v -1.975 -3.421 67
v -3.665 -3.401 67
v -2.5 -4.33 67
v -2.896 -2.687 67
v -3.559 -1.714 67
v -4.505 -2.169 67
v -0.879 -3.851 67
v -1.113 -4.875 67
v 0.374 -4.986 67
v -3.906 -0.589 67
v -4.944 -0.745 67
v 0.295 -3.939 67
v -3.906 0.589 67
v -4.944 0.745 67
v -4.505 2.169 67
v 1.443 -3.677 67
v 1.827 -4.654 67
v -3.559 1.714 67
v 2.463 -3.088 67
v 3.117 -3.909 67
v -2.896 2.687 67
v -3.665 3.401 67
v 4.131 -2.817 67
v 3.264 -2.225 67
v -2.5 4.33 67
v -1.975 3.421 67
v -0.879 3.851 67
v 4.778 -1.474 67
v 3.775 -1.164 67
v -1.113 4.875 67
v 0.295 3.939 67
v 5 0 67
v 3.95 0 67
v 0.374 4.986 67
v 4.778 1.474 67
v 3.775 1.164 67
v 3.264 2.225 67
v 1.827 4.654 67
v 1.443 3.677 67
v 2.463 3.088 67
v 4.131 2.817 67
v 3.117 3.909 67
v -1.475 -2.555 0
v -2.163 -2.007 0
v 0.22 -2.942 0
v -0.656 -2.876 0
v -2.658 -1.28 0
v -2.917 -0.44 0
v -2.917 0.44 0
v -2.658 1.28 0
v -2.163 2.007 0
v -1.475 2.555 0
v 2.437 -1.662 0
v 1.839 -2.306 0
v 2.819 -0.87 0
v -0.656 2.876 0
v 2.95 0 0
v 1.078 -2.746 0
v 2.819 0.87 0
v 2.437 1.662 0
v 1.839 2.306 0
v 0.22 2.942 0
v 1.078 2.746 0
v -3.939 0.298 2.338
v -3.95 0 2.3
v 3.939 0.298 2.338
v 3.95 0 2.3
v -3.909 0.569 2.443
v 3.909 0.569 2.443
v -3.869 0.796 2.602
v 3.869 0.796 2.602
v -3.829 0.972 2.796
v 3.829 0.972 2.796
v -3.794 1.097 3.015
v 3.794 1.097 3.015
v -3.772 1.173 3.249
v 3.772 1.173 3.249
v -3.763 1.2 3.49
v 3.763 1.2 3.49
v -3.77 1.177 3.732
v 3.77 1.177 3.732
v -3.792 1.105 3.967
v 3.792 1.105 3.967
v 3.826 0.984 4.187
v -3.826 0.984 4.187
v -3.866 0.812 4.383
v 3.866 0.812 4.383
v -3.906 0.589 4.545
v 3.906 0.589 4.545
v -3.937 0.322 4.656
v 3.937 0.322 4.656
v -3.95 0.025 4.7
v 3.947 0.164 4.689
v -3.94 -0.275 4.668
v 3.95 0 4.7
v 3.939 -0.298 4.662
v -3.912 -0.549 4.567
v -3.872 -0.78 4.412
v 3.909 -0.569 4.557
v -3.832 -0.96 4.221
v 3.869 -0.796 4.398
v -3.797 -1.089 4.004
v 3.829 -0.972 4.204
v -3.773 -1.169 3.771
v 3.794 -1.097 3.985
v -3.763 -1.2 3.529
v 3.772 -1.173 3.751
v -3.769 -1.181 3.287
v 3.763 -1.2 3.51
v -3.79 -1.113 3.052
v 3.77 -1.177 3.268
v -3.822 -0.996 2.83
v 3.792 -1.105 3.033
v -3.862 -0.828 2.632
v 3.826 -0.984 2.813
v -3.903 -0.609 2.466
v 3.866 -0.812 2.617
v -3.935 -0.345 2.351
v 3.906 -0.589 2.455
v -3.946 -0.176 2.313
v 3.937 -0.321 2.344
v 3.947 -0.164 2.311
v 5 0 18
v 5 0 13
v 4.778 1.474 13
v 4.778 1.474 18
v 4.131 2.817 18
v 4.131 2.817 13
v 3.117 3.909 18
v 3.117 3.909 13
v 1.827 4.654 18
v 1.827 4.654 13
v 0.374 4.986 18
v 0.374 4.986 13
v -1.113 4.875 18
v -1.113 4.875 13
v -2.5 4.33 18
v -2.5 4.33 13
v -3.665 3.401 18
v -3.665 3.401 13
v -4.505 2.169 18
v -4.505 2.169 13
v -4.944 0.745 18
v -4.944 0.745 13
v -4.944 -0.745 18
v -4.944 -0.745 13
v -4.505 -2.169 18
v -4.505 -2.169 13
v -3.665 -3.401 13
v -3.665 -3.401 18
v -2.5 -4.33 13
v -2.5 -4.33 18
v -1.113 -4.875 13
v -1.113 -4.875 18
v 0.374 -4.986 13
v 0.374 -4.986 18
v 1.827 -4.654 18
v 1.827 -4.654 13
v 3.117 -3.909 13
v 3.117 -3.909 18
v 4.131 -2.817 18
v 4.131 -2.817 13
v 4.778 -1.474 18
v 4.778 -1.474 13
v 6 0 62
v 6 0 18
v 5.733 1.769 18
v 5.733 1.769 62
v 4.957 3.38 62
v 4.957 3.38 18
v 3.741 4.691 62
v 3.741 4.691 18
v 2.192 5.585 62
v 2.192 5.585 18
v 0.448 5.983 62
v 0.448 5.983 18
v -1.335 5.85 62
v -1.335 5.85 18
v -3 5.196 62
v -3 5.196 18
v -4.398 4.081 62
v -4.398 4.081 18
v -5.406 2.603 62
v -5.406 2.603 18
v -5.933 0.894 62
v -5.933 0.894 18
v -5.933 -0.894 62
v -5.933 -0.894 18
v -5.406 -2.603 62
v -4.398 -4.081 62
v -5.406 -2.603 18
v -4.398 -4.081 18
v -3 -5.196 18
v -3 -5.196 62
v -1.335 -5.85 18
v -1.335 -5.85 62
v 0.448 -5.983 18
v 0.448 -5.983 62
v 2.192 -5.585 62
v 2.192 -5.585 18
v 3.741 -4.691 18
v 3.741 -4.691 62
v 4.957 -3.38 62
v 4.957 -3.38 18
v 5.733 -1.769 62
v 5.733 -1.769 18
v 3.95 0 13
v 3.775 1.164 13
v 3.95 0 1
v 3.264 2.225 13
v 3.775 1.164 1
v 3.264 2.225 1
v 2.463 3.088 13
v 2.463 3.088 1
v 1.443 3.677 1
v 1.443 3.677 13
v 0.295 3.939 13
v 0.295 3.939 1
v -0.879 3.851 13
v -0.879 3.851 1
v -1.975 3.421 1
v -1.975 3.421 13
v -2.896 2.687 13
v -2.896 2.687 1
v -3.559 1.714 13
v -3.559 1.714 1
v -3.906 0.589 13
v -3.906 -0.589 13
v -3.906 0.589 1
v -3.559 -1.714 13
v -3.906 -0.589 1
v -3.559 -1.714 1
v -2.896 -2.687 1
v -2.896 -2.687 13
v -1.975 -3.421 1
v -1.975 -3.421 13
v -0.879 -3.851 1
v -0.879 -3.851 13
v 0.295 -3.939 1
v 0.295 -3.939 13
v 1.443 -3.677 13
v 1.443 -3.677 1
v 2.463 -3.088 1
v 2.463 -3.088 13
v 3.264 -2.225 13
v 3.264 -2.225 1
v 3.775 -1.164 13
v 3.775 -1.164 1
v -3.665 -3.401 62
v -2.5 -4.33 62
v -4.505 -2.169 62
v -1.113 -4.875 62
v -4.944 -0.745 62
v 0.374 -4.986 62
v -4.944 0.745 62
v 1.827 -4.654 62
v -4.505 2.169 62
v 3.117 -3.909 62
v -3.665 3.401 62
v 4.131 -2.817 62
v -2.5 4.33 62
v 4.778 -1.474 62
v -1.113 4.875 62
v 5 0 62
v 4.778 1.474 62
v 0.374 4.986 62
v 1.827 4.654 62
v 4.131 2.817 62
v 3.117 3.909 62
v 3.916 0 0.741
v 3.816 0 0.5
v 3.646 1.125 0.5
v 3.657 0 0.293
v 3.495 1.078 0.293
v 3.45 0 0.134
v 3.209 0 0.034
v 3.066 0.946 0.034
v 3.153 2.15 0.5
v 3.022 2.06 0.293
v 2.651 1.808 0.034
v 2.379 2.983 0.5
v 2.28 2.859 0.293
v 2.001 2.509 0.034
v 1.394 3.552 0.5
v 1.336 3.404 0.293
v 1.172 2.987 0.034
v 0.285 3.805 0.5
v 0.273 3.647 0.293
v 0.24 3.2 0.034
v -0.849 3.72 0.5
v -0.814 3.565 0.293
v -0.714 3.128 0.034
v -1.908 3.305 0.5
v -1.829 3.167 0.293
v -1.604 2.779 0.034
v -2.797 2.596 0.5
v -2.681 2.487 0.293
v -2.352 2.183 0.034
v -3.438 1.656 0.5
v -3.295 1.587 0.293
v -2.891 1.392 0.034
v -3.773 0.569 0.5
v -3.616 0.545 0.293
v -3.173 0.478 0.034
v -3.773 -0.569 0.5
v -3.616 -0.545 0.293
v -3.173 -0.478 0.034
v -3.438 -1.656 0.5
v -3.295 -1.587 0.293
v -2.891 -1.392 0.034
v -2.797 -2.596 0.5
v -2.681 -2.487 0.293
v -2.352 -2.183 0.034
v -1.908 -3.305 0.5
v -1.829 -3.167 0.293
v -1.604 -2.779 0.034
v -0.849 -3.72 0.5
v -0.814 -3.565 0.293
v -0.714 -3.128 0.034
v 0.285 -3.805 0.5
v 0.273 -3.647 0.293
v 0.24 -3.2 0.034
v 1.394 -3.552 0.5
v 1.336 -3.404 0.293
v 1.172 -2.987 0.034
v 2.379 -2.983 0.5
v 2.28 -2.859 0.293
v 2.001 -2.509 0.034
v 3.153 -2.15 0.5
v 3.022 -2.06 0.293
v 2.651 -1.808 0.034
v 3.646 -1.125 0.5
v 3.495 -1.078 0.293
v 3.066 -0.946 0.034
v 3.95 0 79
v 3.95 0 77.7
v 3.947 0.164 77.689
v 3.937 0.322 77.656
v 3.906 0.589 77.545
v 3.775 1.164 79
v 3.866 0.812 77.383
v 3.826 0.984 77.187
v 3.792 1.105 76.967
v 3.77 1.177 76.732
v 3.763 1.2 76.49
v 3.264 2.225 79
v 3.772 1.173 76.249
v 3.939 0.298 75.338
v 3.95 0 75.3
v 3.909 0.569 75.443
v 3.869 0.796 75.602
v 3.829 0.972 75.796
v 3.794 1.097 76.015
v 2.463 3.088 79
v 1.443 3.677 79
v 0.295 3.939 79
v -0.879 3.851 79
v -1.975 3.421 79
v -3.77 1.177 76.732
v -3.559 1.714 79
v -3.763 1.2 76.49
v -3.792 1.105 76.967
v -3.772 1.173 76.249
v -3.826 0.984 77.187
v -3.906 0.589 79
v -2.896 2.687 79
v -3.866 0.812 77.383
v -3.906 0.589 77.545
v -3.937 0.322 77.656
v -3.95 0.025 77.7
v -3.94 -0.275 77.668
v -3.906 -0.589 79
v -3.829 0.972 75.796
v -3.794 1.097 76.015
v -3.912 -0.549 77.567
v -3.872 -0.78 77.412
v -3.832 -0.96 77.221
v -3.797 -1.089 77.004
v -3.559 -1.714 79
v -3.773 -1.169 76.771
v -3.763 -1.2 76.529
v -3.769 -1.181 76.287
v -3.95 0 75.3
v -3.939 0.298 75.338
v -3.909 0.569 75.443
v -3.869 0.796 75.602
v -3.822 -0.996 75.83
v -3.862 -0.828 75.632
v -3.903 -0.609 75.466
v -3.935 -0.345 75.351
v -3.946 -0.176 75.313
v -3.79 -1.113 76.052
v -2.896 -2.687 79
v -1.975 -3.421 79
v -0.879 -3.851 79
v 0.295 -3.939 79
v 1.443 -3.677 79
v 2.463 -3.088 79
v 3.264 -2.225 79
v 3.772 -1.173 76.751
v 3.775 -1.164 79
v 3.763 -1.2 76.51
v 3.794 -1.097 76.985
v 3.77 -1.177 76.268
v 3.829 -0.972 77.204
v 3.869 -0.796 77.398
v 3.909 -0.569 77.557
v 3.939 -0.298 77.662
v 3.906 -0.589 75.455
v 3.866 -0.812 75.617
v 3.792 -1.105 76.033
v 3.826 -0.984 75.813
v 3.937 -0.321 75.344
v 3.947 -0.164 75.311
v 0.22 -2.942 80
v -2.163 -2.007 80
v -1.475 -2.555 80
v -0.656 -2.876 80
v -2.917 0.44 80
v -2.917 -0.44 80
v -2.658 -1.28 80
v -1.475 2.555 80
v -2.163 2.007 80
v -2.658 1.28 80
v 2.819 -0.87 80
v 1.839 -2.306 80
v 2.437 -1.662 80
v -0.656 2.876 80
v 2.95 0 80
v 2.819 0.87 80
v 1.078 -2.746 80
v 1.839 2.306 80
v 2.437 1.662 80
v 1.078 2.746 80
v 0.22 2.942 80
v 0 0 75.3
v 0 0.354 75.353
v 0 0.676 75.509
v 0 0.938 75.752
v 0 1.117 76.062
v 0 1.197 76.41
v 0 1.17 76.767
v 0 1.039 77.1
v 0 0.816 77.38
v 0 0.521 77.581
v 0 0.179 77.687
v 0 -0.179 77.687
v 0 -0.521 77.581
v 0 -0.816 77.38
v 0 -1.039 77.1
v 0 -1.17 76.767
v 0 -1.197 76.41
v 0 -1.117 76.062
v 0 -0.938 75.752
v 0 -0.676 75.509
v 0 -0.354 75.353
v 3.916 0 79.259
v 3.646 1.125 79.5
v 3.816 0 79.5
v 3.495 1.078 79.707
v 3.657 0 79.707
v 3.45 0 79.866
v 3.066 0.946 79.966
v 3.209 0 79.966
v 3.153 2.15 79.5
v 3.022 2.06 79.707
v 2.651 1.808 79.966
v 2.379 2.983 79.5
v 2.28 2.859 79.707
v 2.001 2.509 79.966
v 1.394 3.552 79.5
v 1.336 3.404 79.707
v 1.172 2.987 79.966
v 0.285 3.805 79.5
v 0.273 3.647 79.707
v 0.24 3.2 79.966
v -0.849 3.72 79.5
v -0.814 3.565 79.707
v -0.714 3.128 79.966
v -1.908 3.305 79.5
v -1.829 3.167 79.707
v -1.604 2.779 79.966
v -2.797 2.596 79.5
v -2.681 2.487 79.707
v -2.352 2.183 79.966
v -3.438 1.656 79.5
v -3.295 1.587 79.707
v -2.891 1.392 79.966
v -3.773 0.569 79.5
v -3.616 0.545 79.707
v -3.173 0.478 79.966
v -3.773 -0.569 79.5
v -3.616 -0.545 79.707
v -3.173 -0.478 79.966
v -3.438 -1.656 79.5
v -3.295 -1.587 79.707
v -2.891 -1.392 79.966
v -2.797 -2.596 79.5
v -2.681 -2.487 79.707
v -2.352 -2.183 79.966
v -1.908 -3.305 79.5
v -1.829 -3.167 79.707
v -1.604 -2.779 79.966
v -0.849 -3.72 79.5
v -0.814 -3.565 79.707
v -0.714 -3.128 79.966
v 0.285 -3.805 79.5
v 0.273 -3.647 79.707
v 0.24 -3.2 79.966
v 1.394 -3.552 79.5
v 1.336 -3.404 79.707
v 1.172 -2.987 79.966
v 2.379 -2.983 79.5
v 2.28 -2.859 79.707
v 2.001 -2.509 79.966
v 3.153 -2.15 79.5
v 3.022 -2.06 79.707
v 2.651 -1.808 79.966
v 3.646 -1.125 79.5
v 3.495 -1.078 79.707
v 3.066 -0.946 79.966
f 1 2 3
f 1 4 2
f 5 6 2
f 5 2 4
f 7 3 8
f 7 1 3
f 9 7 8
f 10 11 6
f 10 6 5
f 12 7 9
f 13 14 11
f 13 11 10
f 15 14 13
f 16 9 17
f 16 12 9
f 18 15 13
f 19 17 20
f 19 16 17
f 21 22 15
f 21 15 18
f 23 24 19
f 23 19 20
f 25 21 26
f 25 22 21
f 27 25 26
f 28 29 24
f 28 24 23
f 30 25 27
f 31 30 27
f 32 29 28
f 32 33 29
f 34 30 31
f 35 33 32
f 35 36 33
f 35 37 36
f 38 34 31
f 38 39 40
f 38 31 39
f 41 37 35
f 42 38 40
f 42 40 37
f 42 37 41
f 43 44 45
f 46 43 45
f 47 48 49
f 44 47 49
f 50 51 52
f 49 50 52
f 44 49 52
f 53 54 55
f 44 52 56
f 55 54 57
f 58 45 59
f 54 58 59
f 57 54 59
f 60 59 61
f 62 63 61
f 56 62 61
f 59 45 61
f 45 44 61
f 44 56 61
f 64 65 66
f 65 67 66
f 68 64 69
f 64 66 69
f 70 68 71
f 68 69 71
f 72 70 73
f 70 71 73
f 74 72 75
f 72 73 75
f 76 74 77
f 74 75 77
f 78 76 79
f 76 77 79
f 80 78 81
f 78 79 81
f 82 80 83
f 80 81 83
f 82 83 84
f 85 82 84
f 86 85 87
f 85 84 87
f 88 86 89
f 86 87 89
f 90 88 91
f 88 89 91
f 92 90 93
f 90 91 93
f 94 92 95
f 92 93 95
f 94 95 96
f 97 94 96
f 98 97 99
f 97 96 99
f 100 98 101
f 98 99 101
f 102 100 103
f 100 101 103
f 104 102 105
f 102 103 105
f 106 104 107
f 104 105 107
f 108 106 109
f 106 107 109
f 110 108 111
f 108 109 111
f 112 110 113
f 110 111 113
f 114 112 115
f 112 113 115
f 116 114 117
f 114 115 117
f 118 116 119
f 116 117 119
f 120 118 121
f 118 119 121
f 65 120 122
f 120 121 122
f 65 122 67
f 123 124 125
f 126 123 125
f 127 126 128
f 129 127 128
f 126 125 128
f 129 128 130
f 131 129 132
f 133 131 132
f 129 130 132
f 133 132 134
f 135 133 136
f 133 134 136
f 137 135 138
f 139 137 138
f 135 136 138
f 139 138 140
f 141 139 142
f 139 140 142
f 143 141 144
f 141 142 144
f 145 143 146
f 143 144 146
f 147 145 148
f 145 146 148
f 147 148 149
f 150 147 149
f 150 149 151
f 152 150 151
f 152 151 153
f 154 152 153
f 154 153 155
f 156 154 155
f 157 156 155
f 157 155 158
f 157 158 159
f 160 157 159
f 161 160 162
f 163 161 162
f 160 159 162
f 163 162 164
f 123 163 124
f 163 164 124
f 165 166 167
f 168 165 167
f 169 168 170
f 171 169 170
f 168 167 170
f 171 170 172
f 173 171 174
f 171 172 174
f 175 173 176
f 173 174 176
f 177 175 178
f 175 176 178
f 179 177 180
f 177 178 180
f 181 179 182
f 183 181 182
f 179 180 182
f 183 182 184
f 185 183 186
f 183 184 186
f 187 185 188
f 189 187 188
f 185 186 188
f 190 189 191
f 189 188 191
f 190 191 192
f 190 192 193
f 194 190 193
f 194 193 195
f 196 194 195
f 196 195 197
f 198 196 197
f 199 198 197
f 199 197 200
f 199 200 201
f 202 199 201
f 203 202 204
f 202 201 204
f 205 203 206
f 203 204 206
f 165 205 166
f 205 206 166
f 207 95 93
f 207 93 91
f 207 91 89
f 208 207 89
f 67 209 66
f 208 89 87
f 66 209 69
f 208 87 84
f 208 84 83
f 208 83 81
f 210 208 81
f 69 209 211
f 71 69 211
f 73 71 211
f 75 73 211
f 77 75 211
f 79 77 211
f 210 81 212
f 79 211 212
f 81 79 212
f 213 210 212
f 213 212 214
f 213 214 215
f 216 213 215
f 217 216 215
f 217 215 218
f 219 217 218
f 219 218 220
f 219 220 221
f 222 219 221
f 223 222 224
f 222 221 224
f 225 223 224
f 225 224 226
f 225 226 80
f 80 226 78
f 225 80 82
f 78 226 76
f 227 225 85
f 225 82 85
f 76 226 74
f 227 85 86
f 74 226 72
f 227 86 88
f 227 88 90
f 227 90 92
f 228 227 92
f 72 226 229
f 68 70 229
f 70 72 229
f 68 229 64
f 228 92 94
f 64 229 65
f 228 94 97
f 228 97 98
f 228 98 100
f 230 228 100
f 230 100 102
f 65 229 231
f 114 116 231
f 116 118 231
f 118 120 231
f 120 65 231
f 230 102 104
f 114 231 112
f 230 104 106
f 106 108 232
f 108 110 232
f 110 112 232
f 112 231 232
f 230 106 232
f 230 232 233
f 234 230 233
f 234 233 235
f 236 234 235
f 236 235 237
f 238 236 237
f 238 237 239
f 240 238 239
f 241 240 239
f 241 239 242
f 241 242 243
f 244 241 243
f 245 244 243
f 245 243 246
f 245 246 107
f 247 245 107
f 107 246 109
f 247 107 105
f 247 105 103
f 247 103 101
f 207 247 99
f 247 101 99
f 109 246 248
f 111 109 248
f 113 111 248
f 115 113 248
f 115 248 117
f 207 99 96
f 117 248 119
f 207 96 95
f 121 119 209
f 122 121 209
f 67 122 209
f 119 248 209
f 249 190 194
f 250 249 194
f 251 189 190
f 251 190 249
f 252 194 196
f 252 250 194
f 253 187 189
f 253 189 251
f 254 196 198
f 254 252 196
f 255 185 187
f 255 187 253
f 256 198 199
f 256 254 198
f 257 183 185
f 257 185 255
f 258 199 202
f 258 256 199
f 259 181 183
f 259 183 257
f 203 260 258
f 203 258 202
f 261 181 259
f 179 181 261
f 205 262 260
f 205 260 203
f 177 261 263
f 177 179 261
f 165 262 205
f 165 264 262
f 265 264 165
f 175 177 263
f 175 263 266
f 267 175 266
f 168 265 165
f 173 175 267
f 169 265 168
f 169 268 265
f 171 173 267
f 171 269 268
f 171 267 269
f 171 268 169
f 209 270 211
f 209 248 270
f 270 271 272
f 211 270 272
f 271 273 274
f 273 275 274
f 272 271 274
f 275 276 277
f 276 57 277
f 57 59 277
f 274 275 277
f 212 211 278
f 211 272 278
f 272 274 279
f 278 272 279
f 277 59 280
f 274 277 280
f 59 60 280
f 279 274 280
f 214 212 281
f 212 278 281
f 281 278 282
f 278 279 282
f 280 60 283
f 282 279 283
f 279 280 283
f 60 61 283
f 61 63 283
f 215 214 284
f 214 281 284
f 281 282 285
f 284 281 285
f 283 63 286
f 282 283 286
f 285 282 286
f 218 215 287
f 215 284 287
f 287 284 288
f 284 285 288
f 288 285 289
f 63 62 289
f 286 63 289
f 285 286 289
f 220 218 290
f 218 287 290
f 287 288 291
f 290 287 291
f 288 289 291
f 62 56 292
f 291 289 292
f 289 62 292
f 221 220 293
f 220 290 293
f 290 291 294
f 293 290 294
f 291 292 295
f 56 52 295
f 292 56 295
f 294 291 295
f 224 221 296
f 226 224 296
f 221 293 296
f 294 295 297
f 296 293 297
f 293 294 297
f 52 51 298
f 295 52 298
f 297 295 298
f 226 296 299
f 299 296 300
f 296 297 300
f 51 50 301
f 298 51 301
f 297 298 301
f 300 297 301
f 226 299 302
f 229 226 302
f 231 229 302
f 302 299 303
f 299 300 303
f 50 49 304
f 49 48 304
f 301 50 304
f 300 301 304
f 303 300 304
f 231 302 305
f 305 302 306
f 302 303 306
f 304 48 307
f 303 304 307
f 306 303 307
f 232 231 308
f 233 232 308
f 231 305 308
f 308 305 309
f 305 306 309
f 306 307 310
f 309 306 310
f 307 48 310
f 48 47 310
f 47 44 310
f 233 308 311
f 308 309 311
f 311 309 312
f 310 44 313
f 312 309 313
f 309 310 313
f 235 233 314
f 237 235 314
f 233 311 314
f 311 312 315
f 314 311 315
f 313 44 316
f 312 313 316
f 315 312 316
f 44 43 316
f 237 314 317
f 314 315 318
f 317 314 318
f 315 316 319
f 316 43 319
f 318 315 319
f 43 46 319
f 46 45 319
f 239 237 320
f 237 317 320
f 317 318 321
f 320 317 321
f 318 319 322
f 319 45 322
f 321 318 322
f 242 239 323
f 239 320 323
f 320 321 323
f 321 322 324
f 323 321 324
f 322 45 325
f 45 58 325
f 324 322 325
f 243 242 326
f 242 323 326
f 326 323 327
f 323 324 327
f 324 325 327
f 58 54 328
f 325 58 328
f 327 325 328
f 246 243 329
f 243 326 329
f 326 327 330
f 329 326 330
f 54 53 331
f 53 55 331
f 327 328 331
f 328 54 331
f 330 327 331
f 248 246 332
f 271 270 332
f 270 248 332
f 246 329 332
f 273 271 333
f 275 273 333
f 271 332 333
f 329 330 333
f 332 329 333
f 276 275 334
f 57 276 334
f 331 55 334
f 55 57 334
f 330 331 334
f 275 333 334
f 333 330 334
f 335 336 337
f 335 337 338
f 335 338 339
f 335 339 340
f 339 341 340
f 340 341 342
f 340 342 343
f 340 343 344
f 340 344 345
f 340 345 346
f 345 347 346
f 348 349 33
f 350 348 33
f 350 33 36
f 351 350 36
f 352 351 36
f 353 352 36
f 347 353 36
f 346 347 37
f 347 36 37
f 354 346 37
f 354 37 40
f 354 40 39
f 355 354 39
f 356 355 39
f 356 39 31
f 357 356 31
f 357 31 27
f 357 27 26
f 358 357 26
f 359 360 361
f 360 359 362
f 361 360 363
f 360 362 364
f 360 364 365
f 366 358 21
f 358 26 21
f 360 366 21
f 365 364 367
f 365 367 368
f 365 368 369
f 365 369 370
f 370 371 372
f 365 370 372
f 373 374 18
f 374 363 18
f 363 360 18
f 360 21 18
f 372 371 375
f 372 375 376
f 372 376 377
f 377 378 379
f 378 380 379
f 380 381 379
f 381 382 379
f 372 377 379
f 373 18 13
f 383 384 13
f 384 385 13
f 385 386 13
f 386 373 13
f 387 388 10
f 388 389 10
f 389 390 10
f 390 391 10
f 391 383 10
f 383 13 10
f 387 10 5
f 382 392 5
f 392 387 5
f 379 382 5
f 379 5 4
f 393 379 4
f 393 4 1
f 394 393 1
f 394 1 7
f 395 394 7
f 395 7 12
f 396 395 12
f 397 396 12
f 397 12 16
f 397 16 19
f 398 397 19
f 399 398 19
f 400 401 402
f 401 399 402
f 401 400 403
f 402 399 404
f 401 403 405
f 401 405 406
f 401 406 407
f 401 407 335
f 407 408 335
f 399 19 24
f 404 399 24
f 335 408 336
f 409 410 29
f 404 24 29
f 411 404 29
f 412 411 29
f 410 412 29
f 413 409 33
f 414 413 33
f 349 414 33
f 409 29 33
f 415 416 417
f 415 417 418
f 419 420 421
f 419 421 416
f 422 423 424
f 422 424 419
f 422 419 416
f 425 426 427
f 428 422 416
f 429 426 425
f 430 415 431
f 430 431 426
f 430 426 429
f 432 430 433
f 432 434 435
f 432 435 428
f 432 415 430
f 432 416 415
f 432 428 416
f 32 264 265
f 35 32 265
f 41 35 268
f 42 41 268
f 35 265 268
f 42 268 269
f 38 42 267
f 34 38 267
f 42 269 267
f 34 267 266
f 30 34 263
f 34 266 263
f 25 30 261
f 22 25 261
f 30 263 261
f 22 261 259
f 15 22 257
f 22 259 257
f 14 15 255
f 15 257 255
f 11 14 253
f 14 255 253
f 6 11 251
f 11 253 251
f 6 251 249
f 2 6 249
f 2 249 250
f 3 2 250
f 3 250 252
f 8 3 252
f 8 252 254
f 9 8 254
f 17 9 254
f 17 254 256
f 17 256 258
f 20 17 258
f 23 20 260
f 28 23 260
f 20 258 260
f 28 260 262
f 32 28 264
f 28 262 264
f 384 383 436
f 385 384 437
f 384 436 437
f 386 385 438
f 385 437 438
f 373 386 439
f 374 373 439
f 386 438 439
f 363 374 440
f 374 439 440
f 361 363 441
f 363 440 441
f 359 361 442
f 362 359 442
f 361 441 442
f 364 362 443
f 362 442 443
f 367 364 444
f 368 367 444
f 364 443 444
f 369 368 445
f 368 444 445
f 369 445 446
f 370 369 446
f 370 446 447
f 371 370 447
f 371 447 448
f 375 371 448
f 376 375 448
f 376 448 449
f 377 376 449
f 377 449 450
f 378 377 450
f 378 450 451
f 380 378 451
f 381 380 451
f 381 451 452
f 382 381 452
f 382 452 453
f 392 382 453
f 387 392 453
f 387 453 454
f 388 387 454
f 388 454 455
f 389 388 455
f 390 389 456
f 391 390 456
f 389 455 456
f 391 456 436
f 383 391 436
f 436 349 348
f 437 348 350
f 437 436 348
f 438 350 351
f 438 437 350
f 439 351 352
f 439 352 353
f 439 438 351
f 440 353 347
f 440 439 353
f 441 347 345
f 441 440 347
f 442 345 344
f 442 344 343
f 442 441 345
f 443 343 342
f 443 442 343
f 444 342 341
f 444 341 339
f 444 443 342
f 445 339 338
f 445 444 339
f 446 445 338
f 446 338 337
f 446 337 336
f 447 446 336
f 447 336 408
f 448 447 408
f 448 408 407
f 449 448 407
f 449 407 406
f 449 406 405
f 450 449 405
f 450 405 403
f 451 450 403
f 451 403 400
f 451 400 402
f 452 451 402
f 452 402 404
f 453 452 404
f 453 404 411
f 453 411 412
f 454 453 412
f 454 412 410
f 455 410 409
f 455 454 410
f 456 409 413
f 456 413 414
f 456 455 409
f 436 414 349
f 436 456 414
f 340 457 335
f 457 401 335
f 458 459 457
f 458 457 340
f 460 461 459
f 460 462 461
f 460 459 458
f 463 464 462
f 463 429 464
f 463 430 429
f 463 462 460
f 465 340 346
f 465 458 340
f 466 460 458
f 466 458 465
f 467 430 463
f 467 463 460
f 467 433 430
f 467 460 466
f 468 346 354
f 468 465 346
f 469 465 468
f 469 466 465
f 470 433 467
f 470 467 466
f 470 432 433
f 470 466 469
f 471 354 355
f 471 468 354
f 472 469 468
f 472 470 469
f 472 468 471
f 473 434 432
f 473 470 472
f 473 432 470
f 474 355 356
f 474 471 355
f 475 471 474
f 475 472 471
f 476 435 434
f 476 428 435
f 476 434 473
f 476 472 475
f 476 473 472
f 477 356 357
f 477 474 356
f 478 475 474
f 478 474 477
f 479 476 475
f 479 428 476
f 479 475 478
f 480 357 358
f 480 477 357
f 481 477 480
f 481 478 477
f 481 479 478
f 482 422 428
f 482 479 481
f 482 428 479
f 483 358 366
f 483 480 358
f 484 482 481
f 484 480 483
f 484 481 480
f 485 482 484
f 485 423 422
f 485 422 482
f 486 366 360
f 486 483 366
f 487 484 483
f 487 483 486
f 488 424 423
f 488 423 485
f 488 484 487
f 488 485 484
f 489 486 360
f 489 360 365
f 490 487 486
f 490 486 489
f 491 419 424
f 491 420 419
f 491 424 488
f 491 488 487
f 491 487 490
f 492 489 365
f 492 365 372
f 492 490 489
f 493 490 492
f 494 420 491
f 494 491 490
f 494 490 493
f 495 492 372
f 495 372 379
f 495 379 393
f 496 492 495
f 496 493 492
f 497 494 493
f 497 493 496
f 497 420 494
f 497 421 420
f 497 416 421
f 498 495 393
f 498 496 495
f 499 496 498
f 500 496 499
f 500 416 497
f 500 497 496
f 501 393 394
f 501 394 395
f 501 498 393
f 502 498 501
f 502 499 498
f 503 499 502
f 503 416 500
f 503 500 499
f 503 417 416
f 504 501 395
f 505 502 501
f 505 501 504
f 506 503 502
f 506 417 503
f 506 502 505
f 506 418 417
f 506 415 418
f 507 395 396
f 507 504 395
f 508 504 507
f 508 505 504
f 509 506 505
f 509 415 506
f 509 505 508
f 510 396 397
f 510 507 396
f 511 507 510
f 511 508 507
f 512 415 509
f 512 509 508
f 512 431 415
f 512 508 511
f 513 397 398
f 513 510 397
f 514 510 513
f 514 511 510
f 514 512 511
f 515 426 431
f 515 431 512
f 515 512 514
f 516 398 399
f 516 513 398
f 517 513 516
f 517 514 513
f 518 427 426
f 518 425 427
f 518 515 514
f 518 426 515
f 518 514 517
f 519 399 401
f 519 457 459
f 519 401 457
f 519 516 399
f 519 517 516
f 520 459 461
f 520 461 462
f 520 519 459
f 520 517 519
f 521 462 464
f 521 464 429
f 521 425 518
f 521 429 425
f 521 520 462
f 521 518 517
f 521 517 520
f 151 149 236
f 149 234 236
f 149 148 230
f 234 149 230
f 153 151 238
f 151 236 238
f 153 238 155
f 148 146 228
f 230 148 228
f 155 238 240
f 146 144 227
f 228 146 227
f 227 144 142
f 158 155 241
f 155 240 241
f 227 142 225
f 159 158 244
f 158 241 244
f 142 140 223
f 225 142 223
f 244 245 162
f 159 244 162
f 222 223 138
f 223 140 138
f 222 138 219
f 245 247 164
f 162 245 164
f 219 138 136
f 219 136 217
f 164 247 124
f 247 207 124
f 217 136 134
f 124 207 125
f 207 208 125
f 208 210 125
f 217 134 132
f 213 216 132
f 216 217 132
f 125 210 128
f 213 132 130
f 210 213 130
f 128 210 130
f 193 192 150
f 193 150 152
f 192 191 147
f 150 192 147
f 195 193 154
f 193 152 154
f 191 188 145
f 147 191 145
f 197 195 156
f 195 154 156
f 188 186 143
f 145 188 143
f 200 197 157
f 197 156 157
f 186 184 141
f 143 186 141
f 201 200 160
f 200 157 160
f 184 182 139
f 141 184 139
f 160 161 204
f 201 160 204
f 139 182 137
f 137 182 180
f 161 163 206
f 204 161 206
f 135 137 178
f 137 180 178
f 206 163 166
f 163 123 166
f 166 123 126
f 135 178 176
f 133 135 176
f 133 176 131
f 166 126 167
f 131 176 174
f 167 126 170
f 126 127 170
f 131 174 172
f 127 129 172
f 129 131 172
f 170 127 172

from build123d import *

# Parameters (mm, degrees)
SKETCH1_R           = 3.95
BOSS_EXTRUDE1_DEPTH = 13
SKETCH2_R           = 5
BOSS_EXTRUDE2_DEPTH = 5
SKETCH3_R           = 6
BOSS_EXTRUDE3_DEPTH = 44
SKETCH4_R           = 5
BOSS_EXTRUDE4_DEPTH = 5
SKETCH5_R           = 3.95
BOSS_EXTRUDE5_DEPTH = 13
FILLET1_R           = 1
SKETCH6_R           = 1.2
CUT_EXTRUDE1_DEPTH  = 6.5


with BuildPart() as part:
    # Sketch1 → Boss-Extrude1 (new body)
    with BuildSketch(Plane.XY):
        Circle(SKETCH1_R)
    extrude(amount=BOSS_EXTRUDE1_DEPTH)

    # Sketch2 → Boss-Extrude2 (add)
    with BuildSketch(Plane.XY.offset(13)):
        Circle(SKETCH2_R)
    extrude(amount=BOSS_EXTRUDE2_DEPTH)

    # Sketch3 → Boss-Extrude3 (add)
    with BuildSketch(Plane.XY.offset(18)):
        Circle(SKETCH3_R)
    extrude(amount=BOSS_EXTRUDE3_DEPTH)

    # Sketch4 → Boss-Extrude4 (add)
    with BuildSketch(Plane.XY.offset(62)):
        Circle(SKETCH4_R)
    extrude(amount=BOSS_EXTRUDE4_DEPTH)

    # Sketch5 → Boss-Extrude5 (add)
    with BuildSketch(Plane.XY.offset(67)):
        Circle(SKETCH5_R)
    extrude(amount=BOSS_EXTRUDE5_DEPTH)

    # Fillet1
    fillet1_edges = [part.edges().sort_by_distance(p)[0] for p in [
        (-3.95, 0, 0),
        (-3.95, 0, 80),
    ]]
    fillet(fillet1_edges, radius=FILLET1_R)

    # Sketch6 → Cut-Extrude1 (cut, symmetric)
    with BuildSketch(Plane(origin=(0, 0, 0), x_dir=(0, 0, -1), z_dir=(1, 0, 0))):
        with Locations((-76.5, 0)):
            Circle(SKETCH6_R)
        with Locations((-3.5, 0)):
            Circle(SKETCH6_R)
    extrude(amount=CUT_EXTRUDE1_DEPTH, both=True, mode=Mode.SUBTRACT)


solid = part.part
